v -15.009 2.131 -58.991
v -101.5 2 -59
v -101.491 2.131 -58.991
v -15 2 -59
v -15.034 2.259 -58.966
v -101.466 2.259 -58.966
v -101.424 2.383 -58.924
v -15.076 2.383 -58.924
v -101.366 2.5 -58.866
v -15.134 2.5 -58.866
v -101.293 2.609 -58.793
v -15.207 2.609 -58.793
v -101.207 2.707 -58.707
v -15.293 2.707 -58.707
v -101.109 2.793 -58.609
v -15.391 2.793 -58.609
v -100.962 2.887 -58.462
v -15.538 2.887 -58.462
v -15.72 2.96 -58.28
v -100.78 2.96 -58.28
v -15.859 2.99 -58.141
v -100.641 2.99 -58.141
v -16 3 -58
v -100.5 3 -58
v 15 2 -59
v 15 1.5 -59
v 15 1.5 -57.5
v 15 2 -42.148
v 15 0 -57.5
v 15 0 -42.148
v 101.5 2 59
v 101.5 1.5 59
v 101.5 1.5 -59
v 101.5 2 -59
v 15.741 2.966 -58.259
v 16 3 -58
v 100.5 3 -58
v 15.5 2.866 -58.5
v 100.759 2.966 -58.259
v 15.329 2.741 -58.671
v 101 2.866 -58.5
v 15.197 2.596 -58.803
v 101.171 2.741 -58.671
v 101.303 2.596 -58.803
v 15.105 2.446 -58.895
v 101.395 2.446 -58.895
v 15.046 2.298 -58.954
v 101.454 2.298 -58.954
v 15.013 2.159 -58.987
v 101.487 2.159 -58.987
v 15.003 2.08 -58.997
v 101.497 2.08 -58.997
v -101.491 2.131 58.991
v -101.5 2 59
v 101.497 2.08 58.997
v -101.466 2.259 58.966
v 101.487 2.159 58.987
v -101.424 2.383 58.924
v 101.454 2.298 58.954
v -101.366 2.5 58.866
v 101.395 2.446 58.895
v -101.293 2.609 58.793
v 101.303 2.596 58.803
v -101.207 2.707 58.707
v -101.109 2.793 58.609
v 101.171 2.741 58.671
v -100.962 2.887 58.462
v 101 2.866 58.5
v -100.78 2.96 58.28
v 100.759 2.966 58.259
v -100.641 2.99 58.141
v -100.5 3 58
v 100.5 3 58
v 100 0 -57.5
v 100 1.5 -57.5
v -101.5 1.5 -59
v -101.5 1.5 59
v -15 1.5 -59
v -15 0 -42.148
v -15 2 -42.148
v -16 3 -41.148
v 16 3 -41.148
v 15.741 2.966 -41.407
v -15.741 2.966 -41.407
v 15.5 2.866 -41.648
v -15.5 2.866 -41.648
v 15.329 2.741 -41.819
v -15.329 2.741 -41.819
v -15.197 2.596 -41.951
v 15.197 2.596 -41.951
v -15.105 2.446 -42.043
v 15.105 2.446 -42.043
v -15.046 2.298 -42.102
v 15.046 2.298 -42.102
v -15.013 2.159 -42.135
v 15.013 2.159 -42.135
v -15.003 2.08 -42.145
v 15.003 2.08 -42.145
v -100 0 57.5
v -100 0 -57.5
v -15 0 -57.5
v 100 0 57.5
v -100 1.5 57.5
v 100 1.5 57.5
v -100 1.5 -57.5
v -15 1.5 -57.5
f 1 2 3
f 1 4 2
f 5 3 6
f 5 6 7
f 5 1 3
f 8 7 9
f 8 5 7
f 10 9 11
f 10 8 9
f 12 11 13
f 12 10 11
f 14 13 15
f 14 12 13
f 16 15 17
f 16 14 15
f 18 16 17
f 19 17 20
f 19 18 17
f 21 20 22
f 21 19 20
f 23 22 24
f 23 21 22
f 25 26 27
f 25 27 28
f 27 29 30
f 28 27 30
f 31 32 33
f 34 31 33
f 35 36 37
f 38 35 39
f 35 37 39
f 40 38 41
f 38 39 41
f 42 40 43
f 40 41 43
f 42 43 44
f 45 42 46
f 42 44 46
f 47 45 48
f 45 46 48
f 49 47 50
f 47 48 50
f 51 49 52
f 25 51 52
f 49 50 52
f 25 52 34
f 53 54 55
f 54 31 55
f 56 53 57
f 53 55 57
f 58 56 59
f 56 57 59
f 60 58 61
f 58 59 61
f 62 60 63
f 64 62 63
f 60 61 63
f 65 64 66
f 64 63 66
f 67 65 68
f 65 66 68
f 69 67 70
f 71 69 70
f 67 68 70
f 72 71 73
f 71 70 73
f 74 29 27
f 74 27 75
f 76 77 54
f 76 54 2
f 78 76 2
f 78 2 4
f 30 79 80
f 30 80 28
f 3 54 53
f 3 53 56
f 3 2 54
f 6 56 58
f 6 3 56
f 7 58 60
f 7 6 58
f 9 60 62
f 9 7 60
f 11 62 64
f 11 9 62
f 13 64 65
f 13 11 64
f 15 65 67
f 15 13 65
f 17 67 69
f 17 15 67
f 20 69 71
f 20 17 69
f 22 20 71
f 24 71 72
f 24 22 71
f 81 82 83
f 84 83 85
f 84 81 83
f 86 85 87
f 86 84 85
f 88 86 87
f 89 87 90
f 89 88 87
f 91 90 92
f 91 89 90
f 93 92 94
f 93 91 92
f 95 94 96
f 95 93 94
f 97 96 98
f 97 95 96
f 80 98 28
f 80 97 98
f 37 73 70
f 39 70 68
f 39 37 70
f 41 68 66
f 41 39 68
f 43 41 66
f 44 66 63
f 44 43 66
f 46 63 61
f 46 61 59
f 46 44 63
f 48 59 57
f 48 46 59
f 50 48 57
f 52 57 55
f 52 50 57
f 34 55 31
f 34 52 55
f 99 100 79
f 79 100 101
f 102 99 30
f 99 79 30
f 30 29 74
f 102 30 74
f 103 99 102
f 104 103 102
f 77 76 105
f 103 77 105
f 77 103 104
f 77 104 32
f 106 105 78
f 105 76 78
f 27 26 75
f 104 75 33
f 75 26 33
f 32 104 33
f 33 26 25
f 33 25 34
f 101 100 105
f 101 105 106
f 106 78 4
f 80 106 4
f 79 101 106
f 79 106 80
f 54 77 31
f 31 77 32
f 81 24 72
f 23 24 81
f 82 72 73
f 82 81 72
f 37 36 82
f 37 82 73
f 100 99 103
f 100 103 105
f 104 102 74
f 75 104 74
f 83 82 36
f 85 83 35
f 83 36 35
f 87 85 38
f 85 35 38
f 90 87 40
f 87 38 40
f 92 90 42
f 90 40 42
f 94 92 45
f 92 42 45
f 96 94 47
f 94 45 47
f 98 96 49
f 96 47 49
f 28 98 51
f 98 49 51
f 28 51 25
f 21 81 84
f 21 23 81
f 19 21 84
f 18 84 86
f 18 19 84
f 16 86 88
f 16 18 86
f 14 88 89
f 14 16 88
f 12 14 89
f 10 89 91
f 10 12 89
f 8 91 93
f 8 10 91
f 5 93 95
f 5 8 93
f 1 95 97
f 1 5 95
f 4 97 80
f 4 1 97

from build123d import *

# Parameters (mm, degrees)
SKETCH_1_W          = 200
SKETCH_1_H          = 115
EXTRUDE_1_DEPTH     = 1.5
SKETCH_2_W          = 203
SKETCH_2_H          = 118
EXTRUDE_2_DEPTH     = 1.5
SKETCH_3_W          = 30
SKETCH_3_H          = 18.47287918
CUT_EXTRUDE_1_DEPTH = 11.5
FILLET_3_R          = 1


with BuildPart() as part:
    # 草图1 → 凸台-拉伸1 (new body)
    with BuildSketch(Plane(origin=(0, 0, 0), x_dir=(1, 0, 0), z_dir=(0, 1, 0))):
        Rectangle(SKETCH_1_W, SKETCH_1_H)
    extrude(amount=EXTRUDE_1_DEPTH)

    # 草图2 → 凸台-拉伸2 (add)
    with BuildSketch(Plane(origin=(0, 1.5, 0), x_dir=(1, 0, 0), z_dir=(0, 1, 0))):
        Rectangle(SKETCH_2_W, SKETCH_2_H)
    extrude(amount=EXTRUDE_2_DEPTH)

    # 草图3 → 切除-拉伸1 (cut)
    with BuildSketch(Plane.XZ):
        with Locations((0, -51.38442851)):
            Rectangle(SKETCH_3_W, SKETCH_3_H)
    extrude(amount=-CUT_EXTRUDE_1_DEPTH, mode=Mode.SUBTRACT)

    # 圆角3
    fillet_3_edges = [part.edges().sort_by_distance(p)[0] for p in [
        (101.5, 3, 0),
        (58.25, 3, -59),
        (-101.5, 3, 0),
        (0, 3, 59),
        (-58.25, 3, -59),
        (0, 3, -42.14798892),
        (15, 3, -50.57399446),
        (-15, 3, -50.57399446),
    ]]
    fillet(fillet_3_edges, radius=FILLET_3_R)


solid = part.part
